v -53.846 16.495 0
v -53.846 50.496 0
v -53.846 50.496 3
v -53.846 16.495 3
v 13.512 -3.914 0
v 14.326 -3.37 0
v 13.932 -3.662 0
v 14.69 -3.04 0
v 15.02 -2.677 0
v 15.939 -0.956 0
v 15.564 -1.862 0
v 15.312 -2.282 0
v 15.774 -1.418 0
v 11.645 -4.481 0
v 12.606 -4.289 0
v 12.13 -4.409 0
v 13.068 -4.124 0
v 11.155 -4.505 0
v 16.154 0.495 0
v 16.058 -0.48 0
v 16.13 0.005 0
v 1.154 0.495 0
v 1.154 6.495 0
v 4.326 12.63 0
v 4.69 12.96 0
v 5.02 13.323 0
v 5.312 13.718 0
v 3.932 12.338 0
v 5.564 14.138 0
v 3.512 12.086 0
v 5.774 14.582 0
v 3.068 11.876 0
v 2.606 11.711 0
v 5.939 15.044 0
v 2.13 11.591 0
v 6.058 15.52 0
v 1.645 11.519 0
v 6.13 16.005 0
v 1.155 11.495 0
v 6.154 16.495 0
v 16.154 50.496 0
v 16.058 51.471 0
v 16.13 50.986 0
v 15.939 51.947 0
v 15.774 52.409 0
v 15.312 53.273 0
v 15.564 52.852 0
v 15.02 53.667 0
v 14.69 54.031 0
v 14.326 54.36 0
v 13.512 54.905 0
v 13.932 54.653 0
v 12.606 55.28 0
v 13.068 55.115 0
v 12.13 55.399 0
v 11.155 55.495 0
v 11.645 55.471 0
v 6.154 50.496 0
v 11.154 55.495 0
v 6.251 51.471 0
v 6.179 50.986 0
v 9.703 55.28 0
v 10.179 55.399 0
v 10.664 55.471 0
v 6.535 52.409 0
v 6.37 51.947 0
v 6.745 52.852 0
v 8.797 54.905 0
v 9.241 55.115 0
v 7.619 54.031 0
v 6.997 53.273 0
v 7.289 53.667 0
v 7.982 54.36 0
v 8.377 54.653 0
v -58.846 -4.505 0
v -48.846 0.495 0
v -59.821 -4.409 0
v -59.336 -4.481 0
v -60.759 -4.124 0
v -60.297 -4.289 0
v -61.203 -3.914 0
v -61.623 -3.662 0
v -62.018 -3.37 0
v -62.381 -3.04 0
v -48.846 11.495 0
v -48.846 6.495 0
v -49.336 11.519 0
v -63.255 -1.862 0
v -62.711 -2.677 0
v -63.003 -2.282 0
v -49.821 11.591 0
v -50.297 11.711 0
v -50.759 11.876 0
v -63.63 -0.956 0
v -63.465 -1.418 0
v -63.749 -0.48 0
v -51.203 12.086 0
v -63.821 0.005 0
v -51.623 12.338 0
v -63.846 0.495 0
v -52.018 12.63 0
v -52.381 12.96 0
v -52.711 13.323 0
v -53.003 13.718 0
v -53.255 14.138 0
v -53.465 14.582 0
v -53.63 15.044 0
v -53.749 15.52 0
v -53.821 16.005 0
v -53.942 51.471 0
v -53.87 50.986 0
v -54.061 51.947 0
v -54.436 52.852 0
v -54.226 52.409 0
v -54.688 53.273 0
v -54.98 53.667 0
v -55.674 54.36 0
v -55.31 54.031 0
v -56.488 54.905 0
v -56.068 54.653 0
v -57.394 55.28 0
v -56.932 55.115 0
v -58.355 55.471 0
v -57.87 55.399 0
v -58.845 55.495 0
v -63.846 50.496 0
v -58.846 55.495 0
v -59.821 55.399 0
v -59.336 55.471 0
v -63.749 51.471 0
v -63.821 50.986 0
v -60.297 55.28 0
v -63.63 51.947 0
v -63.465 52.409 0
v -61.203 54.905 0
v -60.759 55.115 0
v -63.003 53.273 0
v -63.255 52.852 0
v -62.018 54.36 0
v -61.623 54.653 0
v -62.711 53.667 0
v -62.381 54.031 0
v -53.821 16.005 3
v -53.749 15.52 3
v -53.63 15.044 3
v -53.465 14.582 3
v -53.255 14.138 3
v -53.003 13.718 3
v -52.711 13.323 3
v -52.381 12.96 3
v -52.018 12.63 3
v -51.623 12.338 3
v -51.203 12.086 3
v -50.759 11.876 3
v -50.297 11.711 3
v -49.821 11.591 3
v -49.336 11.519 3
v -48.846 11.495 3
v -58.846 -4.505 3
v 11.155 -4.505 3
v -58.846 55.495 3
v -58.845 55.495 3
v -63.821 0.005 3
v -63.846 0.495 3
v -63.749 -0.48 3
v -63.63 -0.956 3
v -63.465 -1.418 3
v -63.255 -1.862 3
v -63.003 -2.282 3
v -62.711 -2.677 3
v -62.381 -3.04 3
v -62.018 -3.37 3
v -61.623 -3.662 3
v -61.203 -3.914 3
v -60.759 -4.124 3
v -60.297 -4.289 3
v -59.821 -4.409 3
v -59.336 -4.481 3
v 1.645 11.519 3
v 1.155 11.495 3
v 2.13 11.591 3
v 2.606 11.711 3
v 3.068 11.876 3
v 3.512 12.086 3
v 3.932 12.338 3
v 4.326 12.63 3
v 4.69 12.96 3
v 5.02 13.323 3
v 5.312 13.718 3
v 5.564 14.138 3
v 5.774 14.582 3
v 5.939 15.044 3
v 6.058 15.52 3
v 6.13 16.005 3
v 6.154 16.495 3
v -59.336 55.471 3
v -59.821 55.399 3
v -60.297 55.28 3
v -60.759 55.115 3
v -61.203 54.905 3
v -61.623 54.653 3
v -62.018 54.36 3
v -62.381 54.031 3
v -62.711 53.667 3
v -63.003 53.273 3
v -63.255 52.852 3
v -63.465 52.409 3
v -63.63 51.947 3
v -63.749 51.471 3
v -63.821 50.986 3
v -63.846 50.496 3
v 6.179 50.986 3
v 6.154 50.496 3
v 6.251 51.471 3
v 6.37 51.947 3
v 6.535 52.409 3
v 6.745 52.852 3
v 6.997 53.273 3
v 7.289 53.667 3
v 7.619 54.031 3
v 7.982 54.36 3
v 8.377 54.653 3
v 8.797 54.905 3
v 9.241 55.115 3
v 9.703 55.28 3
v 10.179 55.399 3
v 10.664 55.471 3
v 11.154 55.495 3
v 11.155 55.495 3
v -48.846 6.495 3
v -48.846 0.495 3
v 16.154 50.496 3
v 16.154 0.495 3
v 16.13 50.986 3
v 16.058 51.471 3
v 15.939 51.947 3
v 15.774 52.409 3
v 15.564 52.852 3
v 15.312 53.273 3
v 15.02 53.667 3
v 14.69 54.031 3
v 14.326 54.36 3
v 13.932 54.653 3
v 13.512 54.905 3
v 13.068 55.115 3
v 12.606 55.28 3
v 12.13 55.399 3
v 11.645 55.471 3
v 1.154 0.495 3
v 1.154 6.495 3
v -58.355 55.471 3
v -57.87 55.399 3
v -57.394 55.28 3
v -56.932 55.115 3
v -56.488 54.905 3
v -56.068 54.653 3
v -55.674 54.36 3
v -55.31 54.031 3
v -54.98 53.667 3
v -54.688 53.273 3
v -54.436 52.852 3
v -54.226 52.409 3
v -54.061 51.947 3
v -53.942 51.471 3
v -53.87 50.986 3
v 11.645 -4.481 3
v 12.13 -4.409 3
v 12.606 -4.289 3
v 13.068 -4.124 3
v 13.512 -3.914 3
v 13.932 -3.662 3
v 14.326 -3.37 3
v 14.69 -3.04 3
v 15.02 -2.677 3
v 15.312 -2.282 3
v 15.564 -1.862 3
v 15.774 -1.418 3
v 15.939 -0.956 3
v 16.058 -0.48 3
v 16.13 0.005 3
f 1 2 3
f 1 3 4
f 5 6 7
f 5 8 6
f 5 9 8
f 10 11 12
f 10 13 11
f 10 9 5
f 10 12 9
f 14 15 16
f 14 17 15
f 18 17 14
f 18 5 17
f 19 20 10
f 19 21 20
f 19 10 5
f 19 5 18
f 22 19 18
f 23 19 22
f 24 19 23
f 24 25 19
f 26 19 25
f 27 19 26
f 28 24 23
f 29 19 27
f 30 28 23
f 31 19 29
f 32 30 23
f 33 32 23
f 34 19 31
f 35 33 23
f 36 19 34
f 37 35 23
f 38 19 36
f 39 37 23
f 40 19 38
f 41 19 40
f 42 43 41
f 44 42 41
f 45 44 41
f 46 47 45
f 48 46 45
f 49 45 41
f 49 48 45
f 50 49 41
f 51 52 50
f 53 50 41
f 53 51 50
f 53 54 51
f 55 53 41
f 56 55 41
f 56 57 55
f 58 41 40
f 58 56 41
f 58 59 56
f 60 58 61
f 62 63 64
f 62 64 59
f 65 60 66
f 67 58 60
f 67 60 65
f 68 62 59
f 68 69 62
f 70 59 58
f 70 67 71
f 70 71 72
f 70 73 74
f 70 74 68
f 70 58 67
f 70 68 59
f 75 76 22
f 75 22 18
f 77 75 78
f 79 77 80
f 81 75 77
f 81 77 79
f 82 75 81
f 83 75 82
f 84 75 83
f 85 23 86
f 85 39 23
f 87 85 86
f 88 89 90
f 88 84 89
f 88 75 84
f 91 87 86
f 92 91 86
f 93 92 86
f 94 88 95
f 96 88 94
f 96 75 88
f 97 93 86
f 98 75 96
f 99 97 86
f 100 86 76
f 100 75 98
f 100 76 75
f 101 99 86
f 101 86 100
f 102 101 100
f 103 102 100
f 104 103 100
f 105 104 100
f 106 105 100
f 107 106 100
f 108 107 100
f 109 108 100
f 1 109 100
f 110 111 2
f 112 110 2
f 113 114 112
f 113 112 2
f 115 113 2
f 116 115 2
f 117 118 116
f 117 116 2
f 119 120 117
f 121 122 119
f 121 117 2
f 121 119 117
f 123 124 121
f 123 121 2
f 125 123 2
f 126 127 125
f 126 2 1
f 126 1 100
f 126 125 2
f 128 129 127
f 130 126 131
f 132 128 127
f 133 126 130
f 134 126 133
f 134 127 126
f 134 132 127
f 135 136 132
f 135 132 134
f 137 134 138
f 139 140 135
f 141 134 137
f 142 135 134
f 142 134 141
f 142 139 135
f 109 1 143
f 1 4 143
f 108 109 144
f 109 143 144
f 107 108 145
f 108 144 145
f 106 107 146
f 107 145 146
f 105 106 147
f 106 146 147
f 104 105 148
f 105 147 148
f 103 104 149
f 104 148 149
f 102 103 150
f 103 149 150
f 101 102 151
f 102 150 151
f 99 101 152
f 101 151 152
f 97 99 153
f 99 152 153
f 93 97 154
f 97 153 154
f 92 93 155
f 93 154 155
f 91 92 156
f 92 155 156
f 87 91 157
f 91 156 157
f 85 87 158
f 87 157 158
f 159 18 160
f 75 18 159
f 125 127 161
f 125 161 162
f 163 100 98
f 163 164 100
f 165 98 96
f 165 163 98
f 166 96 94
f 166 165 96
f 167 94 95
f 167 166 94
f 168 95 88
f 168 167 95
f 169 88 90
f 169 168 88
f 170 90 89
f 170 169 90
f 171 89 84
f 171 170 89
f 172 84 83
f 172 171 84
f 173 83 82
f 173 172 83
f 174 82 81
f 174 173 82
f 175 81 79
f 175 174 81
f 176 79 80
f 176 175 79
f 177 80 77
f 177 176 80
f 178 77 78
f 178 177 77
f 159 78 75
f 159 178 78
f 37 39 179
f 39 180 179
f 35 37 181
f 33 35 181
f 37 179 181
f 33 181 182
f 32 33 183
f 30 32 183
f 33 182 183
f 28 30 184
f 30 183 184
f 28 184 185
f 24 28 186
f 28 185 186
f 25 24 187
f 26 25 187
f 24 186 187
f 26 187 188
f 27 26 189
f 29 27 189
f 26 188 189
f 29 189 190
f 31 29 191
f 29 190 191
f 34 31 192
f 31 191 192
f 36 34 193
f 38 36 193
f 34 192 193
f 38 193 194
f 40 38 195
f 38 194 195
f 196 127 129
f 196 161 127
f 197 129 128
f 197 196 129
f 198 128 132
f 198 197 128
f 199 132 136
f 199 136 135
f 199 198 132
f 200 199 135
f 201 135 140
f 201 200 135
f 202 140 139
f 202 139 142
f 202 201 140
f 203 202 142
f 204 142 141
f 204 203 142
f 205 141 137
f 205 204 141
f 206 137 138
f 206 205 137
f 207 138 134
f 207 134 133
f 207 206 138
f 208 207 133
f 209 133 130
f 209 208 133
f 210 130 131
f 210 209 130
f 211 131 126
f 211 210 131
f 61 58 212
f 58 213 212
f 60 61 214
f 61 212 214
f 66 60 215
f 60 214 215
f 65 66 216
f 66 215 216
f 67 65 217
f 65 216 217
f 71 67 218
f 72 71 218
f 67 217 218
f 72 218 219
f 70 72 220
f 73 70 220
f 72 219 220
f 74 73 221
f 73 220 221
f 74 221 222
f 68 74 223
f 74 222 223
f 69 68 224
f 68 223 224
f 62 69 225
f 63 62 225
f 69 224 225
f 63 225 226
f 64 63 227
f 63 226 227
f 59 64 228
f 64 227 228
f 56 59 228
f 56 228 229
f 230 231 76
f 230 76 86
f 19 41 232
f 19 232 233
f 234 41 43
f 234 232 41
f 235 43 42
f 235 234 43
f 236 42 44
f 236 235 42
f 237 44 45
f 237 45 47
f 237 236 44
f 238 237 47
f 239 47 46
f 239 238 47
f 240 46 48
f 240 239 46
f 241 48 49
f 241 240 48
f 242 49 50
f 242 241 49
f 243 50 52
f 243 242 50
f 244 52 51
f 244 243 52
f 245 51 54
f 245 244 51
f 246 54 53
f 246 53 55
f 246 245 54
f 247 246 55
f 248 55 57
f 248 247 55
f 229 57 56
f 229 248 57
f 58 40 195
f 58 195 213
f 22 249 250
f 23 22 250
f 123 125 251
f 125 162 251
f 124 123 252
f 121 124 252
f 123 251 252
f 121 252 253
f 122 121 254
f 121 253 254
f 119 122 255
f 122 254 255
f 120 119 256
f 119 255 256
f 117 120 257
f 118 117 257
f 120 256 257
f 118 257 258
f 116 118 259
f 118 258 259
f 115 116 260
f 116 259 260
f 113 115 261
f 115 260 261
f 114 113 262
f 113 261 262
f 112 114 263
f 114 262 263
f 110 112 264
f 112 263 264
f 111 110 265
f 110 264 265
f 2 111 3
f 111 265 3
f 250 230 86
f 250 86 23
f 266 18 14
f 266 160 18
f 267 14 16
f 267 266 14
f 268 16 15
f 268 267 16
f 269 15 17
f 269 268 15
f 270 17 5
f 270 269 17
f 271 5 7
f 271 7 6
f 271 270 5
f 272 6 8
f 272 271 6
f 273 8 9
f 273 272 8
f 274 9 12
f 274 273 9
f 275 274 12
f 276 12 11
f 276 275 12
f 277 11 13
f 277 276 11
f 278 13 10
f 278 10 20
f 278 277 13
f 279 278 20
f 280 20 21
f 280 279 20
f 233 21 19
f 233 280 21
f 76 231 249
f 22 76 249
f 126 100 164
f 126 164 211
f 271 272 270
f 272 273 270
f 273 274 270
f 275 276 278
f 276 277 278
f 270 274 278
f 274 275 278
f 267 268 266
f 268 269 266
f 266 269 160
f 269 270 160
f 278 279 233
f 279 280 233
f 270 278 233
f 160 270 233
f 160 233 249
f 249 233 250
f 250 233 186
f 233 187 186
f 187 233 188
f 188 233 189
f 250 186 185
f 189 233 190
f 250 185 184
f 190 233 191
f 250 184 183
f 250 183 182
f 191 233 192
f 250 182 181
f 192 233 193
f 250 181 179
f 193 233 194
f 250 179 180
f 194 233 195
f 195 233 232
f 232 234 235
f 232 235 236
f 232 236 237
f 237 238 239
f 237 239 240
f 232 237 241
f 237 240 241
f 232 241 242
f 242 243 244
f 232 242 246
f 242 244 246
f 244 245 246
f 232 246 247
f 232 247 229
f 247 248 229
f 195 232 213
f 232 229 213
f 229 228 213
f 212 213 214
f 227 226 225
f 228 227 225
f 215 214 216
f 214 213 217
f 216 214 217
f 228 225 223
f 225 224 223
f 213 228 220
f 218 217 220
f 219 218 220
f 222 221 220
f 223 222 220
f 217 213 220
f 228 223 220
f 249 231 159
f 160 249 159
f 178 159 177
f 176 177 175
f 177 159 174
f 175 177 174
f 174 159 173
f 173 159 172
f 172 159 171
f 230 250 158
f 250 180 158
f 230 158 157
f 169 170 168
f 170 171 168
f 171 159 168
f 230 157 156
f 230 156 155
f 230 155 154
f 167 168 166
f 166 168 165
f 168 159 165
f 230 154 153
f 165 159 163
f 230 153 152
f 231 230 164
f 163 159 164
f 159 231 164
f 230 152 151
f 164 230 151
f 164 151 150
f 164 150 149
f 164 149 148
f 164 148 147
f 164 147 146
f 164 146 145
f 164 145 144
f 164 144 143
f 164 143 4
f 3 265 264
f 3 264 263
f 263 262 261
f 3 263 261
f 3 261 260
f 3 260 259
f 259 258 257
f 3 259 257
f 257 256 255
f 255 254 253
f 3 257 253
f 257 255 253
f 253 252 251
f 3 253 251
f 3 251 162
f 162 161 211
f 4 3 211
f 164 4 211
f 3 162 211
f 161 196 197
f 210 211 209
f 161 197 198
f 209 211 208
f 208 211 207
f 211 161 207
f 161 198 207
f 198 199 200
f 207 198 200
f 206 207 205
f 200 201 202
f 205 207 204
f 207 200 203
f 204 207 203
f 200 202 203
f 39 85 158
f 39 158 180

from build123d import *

# Parameters (mm, degrees)
EXTRUSION1_DEPTH        = 3
ESQUISSE2_W             = 50
ESQUISSE2_H             = 6
ENL_V_MAT_EXTRU_1_DEPTH = 6
CONG_1_R                = 5


with BuildPart() as part:
    # Esquisse1 → Extrusion1 (new body)
    with BuildSketch(Plane.XY):
        Polygon((-63.845510563, 55.495422535), (-53.845510563, 55.495422535), (-53.845510563, 11.495422535), (6.154489437, 11.495422535), (6.154489437, 55.495422535), (16.154489437, 55.495422535), (16.154489437, -4.504577465), (-63.845510563, -4.504577465), align=None)
    extrude(amount=EXTRUSION1_DEPTH)

    # Esquisse2 → Enlèv. mat.-Extru.1 (cut)
    with BuildSketch(Plane.XY.offset(3)):
        with Locations((-23.845510563, 3.495422535)):
            Rectangle(ESQUISSE2_W, ESQUISSE2_H)
    extrude(amount=-ENL_V_MAT_EXTRU_1_DEPTH, mode=Mode.SUBTRACT)

    # Congé1
    cong_1_edges = [part.edges().sort_by_distance(p)[0] for p in [
        (-53.845510563, 11.495422535, 1.5),
        (6.154489437, 11.495422535, 1.5),
        (16.154489437, 55.495422535, 1.5),
        (6.154489437, 55.495422535, 1.5),
        (-53.845510563, 55.495422535, 1.5),
        (-63.845510563, 55.495422535, 1.5),
        (16.154489437, -4.504577465, 1.5),
        (-63.845510563, -4.504577465, 1.5),
    ]]
    fillet(cong_1_edges, radius=CONG_1_R - 0.0001)  # a hair under: the kernel refuses the full size


solid = part.part
